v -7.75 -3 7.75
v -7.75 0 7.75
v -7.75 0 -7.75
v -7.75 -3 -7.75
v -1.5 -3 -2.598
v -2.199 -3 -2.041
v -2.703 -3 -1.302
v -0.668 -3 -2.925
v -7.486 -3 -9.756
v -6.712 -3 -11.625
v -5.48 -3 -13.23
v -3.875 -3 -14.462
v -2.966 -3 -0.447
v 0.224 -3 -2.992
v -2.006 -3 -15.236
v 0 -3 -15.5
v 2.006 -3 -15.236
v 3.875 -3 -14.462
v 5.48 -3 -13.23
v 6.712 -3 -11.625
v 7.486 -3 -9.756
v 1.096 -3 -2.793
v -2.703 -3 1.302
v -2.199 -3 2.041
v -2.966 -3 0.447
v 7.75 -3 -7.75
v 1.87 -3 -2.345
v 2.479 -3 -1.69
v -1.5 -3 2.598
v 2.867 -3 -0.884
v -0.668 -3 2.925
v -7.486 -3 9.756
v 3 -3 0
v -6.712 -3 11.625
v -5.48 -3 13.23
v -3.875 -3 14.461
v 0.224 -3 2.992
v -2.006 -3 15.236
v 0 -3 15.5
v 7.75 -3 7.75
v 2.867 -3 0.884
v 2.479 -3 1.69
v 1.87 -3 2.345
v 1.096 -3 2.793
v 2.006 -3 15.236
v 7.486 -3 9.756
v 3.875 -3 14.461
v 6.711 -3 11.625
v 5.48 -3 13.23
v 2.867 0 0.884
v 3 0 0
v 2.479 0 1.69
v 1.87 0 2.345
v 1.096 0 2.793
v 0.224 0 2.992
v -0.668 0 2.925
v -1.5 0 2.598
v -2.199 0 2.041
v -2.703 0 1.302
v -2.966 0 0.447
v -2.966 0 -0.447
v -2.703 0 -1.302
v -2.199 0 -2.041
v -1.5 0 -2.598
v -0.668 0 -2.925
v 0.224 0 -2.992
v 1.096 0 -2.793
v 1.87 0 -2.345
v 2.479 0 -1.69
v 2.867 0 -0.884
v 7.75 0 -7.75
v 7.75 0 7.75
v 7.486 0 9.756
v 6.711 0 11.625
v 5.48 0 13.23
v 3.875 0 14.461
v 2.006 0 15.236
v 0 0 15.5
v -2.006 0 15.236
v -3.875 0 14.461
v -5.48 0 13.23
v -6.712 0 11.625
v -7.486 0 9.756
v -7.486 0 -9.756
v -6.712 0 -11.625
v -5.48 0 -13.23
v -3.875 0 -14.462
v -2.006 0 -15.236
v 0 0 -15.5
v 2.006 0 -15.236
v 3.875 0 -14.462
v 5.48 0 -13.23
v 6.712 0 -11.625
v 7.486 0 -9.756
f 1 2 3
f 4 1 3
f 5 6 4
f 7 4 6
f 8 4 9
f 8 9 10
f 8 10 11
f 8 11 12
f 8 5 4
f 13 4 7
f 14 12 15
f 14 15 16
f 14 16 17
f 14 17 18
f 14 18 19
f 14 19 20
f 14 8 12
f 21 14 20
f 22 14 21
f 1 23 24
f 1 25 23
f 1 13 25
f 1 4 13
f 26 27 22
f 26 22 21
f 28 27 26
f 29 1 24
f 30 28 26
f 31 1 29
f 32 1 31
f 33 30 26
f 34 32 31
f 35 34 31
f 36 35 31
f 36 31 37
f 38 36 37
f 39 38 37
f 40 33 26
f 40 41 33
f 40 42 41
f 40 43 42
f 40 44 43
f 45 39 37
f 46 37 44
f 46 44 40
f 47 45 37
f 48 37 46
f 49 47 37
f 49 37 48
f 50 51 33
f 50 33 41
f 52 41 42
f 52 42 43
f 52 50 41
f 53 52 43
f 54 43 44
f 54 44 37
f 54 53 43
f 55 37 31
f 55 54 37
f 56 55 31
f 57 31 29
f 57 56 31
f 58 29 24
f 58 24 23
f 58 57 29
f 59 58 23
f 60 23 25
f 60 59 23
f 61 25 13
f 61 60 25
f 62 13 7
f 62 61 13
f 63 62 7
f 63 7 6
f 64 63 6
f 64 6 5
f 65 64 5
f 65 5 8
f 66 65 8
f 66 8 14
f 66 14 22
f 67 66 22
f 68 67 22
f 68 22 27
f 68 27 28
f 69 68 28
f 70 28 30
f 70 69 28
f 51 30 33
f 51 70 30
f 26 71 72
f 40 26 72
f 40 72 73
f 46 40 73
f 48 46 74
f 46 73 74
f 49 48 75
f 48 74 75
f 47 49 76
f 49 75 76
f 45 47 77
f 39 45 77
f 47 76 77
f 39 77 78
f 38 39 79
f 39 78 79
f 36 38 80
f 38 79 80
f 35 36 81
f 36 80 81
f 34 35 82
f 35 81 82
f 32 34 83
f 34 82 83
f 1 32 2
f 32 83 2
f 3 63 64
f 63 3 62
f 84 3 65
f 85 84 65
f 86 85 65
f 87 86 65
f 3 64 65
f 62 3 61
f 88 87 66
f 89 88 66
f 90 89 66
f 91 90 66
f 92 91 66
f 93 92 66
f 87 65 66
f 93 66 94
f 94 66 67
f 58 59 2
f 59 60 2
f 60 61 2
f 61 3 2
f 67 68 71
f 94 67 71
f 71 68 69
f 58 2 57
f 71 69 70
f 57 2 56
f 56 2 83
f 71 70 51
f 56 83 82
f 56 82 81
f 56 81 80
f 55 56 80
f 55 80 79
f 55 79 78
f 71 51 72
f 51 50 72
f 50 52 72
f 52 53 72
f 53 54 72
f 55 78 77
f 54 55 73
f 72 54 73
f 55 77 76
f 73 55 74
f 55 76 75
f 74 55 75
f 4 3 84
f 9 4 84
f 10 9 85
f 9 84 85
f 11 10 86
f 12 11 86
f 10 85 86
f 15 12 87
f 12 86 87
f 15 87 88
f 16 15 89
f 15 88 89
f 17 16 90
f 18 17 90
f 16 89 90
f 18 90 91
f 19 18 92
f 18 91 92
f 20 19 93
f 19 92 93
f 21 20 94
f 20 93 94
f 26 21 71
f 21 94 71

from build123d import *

# Parameters (mm, degrees)
F0_R     = 3
F1_DEPTH = 3


with BuildPart() as f1:
    # F0 (on Front) → F1 (new body)
    with BuildSketch(Plane.XZ):
        with BuildLine():
            Line((-7.750292, 7.75), (-7.749708, -7.75))
            ThreePointArc((-7.749708, -7.75), (0.000292, -15.500292), (7.750292, -7.75))
            Line((7.750292, -7.75), (7.749708, 7.75))
            ThreePointArc((7.749708, 7.75), (-0.000292, 15.499708), (-7.750292, 7.75))
        make_face()
        Circle(F0_R, mode=Mode.SUBTRACT)
    extrude(amount=F1_DEPTH)


solid = f1.part
